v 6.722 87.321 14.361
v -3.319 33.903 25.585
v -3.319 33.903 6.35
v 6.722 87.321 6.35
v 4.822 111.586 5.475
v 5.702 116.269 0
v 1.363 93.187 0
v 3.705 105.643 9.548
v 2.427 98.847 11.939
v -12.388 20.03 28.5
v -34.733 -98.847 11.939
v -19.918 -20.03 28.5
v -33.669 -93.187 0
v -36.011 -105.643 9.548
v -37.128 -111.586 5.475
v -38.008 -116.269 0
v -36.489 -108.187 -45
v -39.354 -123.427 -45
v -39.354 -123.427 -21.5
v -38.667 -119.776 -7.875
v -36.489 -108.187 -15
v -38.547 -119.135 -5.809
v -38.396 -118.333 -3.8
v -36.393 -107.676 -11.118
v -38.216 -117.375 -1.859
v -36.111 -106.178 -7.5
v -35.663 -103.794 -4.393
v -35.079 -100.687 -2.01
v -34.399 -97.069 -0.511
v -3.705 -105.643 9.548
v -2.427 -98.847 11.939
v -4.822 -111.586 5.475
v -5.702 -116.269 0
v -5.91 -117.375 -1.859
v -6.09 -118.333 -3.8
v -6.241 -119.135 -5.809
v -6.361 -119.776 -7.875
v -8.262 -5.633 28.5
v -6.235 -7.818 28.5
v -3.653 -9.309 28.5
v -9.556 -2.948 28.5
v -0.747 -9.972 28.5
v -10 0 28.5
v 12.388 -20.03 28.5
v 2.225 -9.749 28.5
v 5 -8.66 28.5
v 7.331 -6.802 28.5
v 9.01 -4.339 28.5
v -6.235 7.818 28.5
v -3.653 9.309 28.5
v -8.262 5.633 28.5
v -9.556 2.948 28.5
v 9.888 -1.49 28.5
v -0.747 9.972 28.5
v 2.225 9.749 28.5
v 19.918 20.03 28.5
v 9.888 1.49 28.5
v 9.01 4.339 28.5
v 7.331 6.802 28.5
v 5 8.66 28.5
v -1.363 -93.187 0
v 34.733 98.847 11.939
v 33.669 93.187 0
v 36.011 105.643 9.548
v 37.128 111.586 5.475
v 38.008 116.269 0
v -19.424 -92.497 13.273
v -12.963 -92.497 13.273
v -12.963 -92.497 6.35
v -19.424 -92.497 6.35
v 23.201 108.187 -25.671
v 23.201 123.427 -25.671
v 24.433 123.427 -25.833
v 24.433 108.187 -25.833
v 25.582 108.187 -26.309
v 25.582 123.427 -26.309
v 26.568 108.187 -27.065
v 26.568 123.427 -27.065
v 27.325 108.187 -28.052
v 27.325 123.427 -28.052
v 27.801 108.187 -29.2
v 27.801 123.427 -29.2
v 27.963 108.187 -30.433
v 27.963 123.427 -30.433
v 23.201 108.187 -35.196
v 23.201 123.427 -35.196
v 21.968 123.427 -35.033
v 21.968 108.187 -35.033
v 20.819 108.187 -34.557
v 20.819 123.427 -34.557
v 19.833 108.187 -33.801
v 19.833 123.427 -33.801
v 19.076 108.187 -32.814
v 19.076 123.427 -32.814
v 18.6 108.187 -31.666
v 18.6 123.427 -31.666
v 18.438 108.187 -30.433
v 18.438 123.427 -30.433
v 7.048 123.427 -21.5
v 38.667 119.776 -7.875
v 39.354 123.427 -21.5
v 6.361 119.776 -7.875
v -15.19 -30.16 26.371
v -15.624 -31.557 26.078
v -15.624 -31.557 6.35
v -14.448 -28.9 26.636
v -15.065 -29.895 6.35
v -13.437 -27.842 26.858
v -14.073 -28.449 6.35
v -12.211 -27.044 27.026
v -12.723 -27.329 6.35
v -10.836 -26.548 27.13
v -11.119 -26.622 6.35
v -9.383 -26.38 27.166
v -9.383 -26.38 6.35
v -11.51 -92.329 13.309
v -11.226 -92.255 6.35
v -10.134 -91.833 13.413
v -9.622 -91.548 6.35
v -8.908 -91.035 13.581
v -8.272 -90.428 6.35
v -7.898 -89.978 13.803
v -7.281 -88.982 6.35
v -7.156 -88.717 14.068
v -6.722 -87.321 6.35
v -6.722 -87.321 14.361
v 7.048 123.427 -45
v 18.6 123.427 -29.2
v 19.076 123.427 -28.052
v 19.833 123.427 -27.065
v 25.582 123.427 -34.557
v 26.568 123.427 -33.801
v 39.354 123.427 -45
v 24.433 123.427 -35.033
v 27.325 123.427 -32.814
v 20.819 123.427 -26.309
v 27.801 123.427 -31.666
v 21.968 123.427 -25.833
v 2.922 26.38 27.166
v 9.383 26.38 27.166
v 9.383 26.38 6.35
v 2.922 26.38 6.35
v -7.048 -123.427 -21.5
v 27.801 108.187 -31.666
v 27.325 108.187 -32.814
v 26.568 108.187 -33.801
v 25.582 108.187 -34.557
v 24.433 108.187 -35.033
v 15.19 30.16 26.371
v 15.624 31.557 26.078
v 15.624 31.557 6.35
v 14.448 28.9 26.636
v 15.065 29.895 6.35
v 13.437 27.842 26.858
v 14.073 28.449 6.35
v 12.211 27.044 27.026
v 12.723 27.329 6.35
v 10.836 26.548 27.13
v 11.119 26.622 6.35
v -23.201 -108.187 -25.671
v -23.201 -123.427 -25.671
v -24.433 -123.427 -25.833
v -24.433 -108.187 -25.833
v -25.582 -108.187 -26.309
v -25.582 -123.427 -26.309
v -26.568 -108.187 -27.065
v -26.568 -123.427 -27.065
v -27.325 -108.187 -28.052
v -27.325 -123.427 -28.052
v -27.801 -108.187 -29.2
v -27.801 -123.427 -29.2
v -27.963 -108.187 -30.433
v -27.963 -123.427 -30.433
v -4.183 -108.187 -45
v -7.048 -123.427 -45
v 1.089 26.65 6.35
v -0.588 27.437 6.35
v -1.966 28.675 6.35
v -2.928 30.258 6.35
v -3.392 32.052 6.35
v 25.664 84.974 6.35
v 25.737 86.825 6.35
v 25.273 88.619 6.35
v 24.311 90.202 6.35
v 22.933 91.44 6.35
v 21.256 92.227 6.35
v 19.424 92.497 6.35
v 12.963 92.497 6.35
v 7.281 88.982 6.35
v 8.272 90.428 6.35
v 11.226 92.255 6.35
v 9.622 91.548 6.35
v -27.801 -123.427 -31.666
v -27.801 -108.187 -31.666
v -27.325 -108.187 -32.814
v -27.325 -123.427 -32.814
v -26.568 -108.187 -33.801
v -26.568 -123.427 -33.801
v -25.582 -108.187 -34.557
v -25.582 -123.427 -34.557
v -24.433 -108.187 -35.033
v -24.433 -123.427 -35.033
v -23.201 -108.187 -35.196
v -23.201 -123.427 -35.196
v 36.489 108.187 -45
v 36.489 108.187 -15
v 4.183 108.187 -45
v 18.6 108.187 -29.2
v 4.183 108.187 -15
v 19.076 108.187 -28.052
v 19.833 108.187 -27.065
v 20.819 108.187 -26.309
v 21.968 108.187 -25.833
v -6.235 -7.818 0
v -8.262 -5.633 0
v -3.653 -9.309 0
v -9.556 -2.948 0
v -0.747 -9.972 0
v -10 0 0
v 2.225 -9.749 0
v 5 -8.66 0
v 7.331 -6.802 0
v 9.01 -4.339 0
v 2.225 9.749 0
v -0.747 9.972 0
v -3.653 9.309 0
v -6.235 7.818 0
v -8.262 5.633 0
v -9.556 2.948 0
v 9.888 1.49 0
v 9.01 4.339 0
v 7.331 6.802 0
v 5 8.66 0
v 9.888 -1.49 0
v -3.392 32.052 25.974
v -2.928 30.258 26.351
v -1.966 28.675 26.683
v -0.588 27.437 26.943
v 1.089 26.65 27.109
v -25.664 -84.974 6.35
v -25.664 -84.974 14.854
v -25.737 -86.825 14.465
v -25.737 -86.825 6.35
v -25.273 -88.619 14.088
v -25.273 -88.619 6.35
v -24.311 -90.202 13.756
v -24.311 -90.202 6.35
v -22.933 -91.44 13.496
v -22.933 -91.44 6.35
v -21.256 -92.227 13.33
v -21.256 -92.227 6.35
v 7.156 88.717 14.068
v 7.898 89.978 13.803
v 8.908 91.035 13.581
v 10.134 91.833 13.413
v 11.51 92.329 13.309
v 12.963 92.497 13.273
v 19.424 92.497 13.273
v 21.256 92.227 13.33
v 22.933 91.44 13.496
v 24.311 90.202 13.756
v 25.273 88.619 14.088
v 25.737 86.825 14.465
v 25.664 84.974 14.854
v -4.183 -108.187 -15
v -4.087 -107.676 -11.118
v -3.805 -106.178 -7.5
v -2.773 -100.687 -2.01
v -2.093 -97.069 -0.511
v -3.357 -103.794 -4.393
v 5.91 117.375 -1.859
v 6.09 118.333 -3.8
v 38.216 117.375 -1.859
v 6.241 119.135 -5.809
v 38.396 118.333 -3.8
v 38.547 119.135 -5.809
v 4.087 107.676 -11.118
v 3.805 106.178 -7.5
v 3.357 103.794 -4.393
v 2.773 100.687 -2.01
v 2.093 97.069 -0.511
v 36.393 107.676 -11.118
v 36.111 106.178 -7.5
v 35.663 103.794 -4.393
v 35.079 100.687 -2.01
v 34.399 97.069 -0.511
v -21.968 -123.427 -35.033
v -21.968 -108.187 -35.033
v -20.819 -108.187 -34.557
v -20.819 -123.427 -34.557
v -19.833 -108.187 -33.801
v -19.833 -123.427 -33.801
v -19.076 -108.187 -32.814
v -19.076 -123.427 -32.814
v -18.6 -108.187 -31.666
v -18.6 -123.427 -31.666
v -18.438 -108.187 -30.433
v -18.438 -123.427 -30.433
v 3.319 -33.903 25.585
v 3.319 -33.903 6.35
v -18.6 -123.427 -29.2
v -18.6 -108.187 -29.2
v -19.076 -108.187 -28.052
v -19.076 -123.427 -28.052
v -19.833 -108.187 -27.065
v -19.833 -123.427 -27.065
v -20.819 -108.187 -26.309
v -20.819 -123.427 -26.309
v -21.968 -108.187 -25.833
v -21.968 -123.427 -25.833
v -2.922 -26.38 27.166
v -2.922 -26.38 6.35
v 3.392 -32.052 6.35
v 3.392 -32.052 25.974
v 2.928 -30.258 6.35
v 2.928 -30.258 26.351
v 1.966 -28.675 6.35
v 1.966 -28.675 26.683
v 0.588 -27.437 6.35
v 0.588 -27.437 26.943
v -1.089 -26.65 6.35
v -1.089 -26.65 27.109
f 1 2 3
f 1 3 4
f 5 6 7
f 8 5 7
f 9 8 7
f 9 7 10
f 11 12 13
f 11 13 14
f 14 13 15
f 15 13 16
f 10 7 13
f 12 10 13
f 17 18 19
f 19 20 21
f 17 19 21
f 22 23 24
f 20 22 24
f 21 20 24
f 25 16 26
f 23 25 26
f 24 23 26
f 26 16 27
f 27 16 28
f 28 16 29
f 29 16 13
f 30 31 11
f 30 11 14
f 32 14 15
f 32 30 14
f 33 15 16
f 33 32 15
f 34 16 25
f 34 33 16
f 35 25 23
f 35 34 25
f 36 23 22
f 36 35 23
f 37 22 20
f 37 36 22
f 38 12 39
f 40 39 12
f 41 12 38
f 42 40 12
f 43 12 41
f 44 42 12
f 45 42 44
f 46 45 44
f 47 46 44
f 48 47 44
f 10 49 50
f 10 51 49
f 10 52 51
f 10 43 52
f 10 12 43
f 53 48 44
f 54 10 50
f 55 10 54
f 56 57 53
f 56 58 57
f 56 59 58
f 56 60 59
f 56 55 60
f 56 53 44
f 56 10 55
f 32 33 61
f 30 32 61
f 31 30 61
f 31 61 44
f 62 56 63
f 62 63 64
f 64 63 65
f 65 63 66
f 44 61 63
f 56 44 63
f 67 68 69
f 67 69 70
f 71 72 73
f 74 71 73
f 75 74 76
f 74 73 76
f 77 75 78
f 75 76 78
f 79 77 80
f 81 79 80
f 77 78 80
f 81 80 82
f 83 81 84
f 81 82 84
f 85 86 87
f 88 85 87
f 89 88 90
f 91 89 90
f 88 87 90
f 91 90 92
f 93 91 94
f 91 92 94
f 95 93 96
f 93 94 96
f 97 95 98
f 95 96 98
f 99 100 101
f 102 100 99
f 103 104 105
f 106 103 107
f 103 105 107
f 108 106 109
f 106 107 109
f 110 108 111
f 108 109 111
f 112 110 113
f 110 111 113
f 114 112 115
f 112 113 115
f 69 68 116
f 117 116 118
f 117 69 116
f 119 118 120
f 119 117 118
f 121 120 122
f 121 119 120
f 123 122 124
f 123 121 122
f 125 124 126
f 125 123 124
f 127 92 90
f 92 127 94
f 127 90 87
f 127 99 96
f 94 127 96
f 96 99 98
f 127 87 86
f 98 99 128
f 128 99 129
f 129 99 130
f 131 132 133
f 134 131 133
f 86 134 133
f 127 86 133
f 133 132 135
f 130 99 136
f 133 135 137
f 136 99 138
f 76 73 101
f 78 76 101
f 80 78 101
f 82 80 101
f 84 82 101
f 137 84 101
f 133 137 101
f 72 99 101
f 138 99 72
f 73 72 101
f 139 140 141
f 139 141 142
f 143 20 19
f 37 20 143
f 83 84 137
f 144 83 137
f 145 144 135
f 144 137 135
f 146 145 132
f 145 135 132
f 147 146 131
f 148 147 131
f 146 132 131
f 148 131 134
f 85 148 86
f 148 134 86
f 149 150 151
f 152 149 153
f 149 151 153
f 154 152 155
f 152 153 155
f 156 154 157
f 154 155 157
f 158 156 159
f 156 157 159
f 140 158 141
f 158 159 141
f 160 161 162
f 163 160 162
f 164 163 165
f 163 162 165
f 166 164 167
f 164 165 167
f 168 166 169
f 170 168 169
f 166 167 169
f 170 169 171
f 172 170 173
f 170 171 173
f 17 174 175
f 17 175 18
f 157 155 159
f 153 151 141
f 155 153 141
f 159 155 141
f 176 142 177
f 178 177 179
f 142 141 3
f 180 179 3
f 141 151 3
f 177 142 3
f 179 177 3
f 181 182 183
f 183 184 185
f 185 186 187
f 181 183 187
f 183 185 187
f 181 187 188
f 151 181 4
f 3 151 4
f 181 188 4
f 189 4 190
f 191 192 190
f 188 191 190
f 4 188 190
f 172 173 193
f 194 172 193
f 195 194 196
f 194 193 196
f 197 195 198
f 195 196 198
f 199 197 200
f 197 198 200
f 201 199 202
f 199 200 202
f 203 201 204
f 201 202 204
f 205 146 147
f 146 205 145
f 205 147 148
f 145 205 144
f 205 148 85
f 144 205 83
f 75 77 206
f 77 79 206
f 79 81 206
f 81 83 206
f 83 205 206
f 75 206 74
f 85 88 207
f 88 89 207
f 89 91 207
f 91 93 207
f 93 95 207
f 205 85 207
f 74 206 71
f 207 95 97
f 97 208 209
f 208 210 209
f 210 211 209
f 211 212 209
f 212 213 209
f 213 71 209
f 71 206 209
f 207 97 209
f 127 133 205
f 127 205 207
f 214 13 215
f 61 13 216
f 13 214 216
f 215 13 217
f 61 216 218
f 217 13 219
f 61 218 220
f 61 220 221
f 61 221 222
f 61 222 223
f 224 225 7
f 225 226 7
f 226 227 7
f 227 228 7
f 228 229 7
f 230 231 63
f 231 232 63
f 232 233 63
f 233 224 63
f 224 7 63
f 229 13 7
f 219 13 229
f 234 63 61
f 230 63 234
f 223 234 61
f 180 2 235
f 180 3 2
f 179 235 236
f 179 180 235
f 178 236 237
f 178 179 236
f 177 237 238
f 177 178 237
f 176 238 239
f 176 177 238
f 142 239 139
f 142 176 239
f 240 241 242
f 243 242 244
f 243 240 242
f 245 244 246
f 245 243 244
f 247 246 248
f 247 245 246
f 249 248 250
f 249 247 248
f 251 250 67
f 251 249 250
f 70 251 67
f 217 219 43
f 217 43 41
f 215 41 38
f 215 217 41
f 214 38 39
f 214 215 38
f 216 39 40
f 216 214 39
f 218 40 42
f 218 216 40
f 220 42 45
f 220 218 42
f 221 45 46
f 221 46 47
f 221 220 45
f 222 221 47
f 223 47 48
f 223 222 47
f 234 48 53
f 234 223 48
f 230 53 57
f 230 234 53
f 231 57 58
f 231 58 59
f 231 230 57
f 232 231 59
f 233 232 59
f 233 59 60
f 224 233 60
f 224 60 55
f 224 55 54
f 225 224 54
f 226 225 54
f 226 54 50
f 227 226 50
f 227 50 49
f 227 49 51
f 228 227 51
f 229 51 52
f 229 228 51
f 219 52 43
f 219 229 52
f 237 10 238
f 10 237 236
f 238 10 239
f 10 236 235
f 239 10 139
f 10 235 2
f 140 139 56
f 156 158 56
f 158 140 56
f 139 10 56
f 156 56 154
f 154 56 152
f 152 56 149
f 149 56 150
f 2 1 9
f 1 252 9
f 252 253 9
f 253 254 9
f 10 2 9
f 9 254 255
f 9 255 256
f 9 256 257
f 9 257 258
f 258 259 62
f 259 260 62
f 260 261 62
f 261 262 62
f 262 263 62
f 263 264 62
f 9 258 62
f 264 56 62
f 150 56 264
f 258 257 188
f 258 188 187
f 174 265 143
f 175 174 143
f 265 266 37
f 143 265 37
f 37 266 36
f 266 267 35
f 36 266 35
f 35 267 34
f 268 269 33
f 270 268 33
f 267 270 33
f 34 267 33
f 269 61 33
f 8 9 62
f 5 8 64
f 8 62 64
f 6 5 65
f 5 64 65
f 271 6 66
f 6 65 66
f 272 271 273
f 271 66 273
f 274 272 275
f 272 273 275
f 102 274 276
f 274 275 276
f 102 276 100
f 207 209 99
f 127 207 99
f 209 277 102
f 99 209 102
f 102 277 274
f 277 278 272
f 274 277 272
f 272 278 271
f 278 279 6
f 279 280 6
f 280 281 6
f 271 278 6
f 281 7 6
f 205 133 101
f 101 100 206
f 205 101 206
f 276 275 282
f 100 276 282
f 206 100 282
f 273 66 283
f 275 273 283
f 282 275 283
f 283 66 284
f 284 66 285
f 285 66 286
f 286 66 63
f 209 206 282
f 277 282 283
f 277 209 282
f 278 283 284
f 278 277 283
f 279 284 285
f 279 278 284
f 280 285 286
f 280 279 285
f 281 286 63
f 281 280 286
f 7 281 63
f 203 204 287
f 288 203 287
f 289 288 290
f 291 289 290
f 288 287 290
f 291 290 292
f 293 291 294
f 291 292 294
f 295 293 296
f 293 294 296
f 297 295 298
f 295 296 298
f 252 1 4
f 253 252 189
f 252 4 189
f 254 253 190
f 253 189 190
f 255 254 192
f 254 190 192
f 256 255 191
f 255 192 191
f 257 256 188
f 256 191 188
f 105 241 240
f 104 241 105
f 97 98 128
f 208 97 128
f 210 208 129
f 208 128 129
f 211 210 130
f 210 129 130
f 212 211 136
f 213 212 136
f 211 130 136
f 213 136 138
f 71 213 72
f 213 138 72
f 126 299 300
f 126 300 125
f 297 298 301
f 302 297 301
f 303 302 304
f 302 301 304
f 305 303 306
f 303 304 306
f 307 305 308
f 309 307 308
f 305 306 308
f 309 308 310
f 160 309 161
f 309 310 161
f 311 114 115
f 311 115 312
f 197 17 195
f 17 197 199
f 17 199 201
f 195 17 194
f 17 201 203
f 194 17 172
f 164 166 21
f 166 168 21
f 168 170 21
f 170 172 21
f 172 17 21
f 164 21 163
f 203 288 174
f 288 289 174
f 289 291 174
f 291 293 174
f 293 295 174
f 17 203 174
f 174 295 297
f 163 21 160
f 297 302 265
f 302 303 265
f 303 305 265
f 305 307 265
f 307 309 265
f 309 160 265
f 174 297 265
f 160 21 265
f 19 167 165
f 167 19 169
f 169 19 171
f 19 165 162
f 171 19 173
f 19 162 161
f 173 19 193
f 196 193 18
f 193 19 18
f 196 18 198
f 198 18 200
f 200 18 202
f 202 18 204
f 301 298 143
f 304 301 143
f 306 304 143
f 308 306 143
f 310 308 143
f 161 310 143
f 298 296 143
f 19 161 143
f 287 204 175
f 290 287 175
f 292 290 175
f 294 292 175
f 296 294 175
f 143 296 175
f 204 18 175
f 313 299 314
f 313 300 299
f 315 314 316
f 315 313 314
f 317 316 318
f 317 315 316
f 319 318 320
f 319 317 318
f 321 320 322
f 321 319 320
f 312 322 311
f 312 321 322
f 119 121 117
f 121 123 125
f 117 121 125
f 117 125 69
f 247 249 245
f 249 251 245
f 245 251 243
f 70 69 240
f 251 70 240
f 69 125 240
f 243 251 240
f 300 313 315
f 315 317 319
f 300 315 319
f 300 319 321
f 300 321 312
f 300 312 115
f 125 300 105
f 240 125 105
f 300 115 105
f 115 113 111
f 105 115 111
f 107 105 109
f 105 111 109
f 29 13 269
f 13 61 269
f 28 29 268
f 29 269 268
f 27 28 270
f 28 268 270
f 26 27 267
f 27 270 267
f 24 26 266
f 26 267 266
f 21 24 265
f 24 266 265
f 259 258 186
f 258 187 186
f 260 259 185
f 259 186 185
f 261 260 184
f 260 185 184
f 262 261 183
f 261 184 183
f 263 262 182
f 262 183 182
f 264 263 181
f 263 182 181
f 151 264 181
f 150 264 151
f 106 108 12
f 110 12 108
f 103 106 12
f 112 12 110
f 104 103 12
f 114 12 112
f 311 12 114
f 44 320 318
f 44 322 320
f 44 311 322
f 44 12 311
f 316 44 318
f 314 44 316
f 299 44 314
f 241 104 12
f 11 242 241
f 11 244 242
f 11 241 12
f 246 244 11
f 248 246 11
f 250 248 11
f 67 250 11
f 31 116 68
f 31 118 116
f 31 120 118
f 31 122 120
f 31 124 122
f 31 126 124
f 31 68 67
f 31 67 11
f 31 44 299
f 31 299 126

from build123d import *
from OCP.BRepFilletAPI import BRepFilletAPI_MakeChamfer

# Parameters (mm, degrees)
SKETCH1_R           = 10
BOSS_EXTRUDE1_DEPTH = 28.5
BOSS_EXTRUDE2_DEPTH = 45
CUT_EXTRUDE1_DEPTH  = 30
CIRPATTERN1_COUNT   = 2
CHAMFER1_SIZE       = 50
CHAMFER1_SIZE2      = 13.397459622
FILLET3_R           = 15
CHAMFER2_SIZE       = 90
CHAMFER2_SIZE2      = 13.607292824
CUT_EXTRUDE2_DEPTH  = 138.142132616
CUT_EXTRUDE4_DEPTH  = 22.15
FILLET6_R           = 6.35


with BuildPart() as part:
    # Sketch1 → Boss-Extrude1 (new body)
    with BuildSketch(Plane.XY):
        Polygon((-7.047570808, -123.427136592), (39.353608362, 123.427136592), (7.047570808, 123.427136592), (-39.353608362, -123.427136592), align=None)
        with Locations(Location((0, 0, 0), (0, 0, 180))):
            Circle(SKETCH1_R, mode=Mode.SUBTRACT)
    extrude(amount=BOSS_EXTRUDE1_DEPTH)

    # Sketch2 → Boss-Extrude2 (add)
    with BuildSketch(Plane(origin=(0, 0, 0), x_dir=(-1, 0, 0), z_dir=(0, 0, -1))):
        Polygon((-39.353608362, 123.427136592), (-36.488946708, 108.187136592), (-4.182909154, 108.187136592), (-7.047570808, 123.427136592), align=None)
        Polygon((36.488946708, -108.187136592), (4.182909154, -108.187136592), (7.047570808, -123.427136592), (39.353608362, -123.427136592), align=None)
    extrude(amount=BOSS_EXTRUDE2_DEPTH)

    # Sketch4 → Cut-Extrude1 (cut)
    with BuildSketch(Plane(origin=(0, 123.427136592, 0), x_dir=(1, 0, 0), z_dir=(0, 1, 0))):
        with BuildLine():
            ThreePointArc((18.438089585, 30.433032299), (19.83299354, 27.065436254), (23.200589585, 25.670532299))
            Line((23.200589585, 25.670532299), (23.200589585, 30.433032299))
            Line((23.200589585, 30.433032299), (18.438089585, 30.433032299))
        make_face()
        with BuildLine():
            Line((23.200589585, 30.433032299), (23.200589585, 25.670532299))
            ThreePointArc((23.200589585, 25.670532299), (26.56818563, 27.065436254), (27.963089585, 30.433032299))
            Line((27.963089585, 30.433032299), (23.200589585, 30.433032299))
        make_face()
        with BuildLine():
            Line((18.438089585, 30.433032299), (23.200589585, 30.433032299))
            Line((23.200589585, 30.433032299), (23.200589585, 35.195532299))
            ThreePointArc((23.200589585, 35.195532299), (19.83299354, 33.800628344), (18.438089585, 30.433032299))
        make_face()
        with BuildLine():
            Line((23.200589585, 35.195532299), (23.200589585, 30.433032299))
            Line((23.200589585, 30.433032299), (27.963089585, 30.433032299))
            ThreePointArc((27.963089585, 30.433032299), (26.56818563, 33.800628344), (23.200589585, 35.195532299))
        make_face()
    cut_extrude1 = extrude(amount=-CUT_EXTRUDE1_DEPTH, mode=Mode.SUBTRACT)

    # CirPattern1: Cut-Extrude1 ×2 about axis
    cirpattern1_axis = Axis((0, 0, 28.5), (0, 0, -1))
    for i in range(1, CIRPATTERN1_COUNT):
        add(cut_extrude1.rotate(cirpattern1_axis, i * 360 / CIRPATTERN1_COUNT), mode=Mode.SUBTRACT)

    # Chamfer1: one chamfer whose edges measure the first distance from different faces: ONE call of the kernel's chamfer builder (chamfer() names one face for all edges)
    chamfer1_edges_1 = [part.edges().sort_by_distance(p)[0] for p in [
        (-23.200589585, -123.427136592, 28.5),
    ]]
    chamfer1_side_1 = [part.faces().sort_by_distance(p)[0] for p in [
        (-23.200589585, -123.427136592, -7.563719055),
    ]]
    chamfer1_edges_2 = [part.edges().sort_by_distance(p)[0] for p in [
        (23.200589585, 123.427136592, 28.5),
    ]]
    chamfer1_side_2 = [part.faces().sort_by_distance(p)[0] for p in [
        (23.200589585, 123.427136592, -7.563719055),
    ]]
    chamfer1 = BRepFilletAPI_MakeChamfer(part.part.solid().wrapped)
    for e in chamfer1_edges_1:
        chamfer1.Add(CHAMFER1_SIZE, CHAMFER1_SIZE2, e.wrapped, chamfer1_side_1[0].wrapped)  # the first distance lies on this face
    for e in chamfer1_edges_2:
        chamfer1.Add(CHAMFER1_SIZE, CHAMFER1_SIZE2, e.wrapped, chamfer1_side_2[0].wrapped)  # the first distance lies on this face
    add(Compound.cast(chamfer1.Shape()), mode=Mode.REPLACE)

    # Fillet3
    fillet3_edges = [part.edges().sort_by_distance(p)[0] for p in [
        (20.335927931, 108.187136592, 0),
        (-20.335927931, -108.187136592, 0),
    ]]
    fillet(fillet3_edges, radius=FILLET3_R)

    # Chamfer2
    chamfer2_edges = [part.edges().sort_by_distance(p)[0] for p in [
        (-20.682270107, -110.02967697, 28.5),
        (20.682270107, 110.02967697, 28.5),
    ]]
    chamfer2_side = [part.faces().sort_by_distance(p)[0] for p in [
        (13.872325433, 0.428701757, 28.5),
    ]]
    chamfer(chamfer2_edges, length=CHAMFER2_SIZE, length2=CHAMFER2_SIZE2, reference=chamfer2_side[0])

    # Sketch10 → Cut-Extrude2 (cut, symmetric)
    with BuildSketch(Plane(origin=(0, 0, 0), x_dir=(0, 0, -1), z_dir=(1, 0, 0))):
        with BuildLine():
            Line((-28.5, 20.02967697), (-11.939027322, 98.847487856))
            ThreePointArc((-11.939027322, 98.847487856), (-4.989688501, 112.112334692), (7.875417438, 119.776440697))
            Line((7.875417438, 119.776440697), (-24.698068362, 128.387749722))
            Line((-24.698068362, 128.387749722), (-33.956814005, 23.522391457))
            Line((-33.956814005, 23.522391457), (-28.5, 20.02967697))
        make_face()
    cut_extrude2 = extrude(amount=CUT_EXTRUDE2_DEPTH, both=True, mode=Mode.SUBTRACT)

    # Mirror1: Cut-Extrude2 across plane
    add(cut_extrude2.mirror(Plane.ZX), mode=Mode.SUBTRACT)

    # Sketch11 → Cut-Extrude4 (cut)
    with BuildSketch(Plane.XY.offset(28.5)):
        Polygon((14.650397163, 26.37967697), (-4.73322537, 26.37967697), (7.694934571, 92.497487856), (27.078557104, 92.497487856), align=None)
        Polygon((-14.650397163, -26.37967697), (4.73322537, -26.37967697), (-7.694934571, -92.497487856), (-27.078557104, -92.497487856), align=None)
    extrude(amount=-CUT_EXTRUDE4_DEPTH, mode=Mode.SUBTRACT)

    # Fillet6
    fillet6_edges = [part.edges().sort_by_distance(p)[0] for p in [
        (14.650397163, 26.37967697, 16.757878094),
        (-4.73322537, 26.37967697, 16.757878094),
        (7.694934571, 92.497487856, 9.811635567),
        (27.078557104, 92.497487856, 9.811635567),
        (-27.078557104, -92.497487856, 9.811635567),
        (-7.694934571, -92.497487856, 9.811635567),
        (4.73322537, -26.37967697, 16.757878094),
        (-14.650397163, -26.37967697, 16.757878094),
    ]]
    fillet(fillet6_edges, radius=FILLET6_R)


solid = part.part
